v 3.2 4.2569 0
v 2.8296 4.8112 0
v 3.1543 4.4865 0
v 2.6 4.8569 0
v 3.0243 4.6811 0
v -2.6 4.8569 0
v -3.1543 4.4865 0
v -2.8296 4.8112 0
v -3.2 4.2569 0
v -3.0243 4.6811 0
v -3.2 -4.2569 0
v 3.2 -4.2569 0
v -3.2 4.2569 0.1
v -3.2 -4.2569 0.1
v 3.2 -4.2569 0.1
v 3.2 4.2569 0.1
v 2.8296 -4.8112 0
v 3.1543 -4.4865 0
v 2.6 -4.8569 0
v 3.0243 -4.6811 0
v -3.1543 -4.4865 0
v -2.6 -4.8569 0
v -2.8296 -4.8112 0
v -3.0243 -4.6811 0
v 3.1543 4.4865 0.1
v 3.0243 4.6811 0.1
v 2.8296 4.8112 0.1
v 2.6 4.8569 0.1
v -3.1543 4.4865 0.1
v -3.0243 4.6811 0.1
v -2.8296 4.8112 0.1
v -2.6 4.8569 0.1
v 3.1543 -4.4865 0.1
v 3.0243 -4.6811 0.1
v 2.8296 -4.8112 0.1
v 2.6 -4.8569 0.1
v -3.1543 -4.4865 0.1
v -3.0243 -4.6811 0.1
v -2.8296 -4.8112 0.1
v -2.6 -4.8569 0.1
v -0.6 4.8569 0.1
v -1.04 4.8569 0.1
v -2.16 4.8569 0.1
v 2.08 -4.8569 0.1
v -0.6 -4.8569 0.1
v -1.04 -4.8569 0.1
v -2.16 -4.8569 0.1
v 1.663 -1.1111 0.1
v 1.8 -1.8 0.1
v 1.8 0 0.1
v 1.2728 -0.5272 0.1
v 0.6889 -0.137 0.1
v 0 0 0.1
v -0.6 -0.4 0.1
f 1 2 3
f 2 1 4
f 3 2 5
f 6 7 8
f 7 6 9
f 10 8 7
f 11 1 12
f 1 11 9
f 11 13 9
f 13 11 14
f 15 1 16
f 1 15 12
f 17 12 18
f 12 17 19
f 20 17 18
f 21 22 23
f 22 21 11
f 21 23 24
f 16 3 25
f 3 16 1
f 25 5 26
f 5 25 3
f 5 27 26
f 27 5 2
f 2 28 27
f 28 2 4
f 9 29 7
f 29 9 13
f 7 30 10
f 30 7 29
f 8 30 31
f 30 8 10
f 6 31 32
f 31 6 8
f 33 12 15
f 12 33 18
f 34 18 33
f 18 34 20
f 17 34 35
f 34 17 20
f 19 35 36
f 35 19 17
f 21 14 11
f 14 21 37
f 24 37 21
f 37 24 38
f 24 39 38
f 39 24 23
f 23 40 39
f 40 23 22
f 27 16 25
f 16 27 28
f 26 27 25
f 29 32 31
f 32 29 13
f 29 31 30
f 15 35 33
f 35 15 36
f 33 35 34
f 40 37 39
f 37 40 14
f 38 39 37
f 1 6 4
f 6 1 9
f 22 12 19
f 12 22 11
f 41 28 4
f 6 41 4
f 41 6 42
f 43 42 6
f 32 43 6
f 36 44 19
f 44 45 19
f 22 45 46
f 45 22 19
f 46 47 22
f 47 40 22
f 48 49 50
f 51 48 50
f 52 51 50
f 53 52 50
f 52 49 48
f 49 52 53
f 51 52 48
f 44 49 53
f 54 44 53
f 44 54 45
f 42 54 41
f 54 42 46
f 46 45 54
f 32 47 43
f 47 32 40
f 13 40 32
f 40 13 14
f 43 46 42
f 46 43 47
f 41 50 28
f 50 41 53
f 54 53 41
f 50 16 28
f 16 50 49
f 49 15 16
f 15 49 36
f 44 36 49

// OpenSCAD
// file: ../p/box3u12.scad
use <../lib.scad>
function ldraw_lib__box3u12() = [
// 0 Box with 3 Parallel Faces without Any Edges
// 0 Name: box3u12.dat
// 0 Author: J.C. Tchang [tchang]
// 0 !LDRAW_ORG Primitive UPDATE 2014-02
// 0 !LICENSE Licensed under CC BY 4.0 : see CAreadme.txt
// 
// 0 BFC CERTIFY CCW
  [0,"BFC","CERTIFY"],
  [0,"BFC","CCW"],
// 
// 0 !HISTORY 2014-12-23 [PTadmin] Official Update 2014-02
// 
// 
// 4 16 -1 1 1 1 1 1 1 1 -1 -1 1 -1
  [4,16,-1,1,1,1,1,1,1,1,-1,-1,1,-1],
// 4 16 -1 1 1 -1 0 1 1 0 1 1 1 1
  [4,16,-1,1,1,-1,0,1,1,0,1,1,1,1],
// 4 16 1 1 -1 1 0 -1 -1 0 -1 -1 1 -1
  [4,16,1,1,-1,1,0,-1,-1,0,-1,-1,1,-1],
];
module ldraw_lib__box3u12(step=0, col=false, unit=2/5, alt=false, line=0.2, solid=!$preview)
    makepoly(ldraw_lib__box3u12(), step=step, col=col, unit=unit, alt=alt, line=line, solid=solid);
ldraw_lib__box3u12(line=0.2);
// file: ../p/1-4ndis.scad
use <../lib.scad>
function ldraw_lib__1_4ndis() = [
// 0 Disc Negative 0.25
// 0 Name: 1-4ndis.dat
// 0 Author: James Jessiman
// 0 !LDRAW_ORG Primitive UPDATE 2012-01
// 0 !LICENSE Licensed under CC BY 4.0 : see CAreadme.txt
// 
// 0 BFC CERTIFY CCW
  [0,"BFC","CERTIFY"],
  [0,"BFC","CCW"],
// 
// 0 !HISTORY 2002-03-23 [sbliss] Added BFC Statement
// 0 !HISTORY 2002-04-25 [PTadmin] Official Update 2002-02
// 0 !HISTORY 2007-06-22 [PTadmin] Header formatted for Contributor Agreement
// 0 !HISTORY 2008-07-01 [PTadmin] Official Update 2008-01
// 0 !HISTORY 2012-02-16 [Philo] Changed to CCW
// 0 !HISTORY 2012-03-30 [PTadmin] Official Update 2012-01
// 
// 
// 3 16 0.9239 0 0.3827 1 0 0 1 0 1
  [3,16,0.9239,0,0.3827,1,0,0,1,0,1],
// 3 16 0.7071 0 0.7071 0.9239 0 0.3827 1 0 1
  [3,16,0.7071,0,0.7071,0.9239,0,0.3827,1,0,1],
// 3 16 0.3827 0 0.9239 0.7071 0 0.7071 1 0 1
  [3,16,0.3827,0,0.9239,0.7071,0,0.7071,1,0,1],
// 3 16 0 0 1 0.3827 0 0.9239 1 0 1
  [3,16,0,0,1,0.3827,0,0.9239,1,0,1],
];
module ldraw_lib__1_4ndis(step=0, col=false, unit=2/5, alt=false, line=0.2, solid=!$preview)
    makepoly(ldraw_lib__1_4ndis(), step=step, col=col, unit=unit, alt=alt, line=line, solid=solid);
ldraw_lib__1_4ndis(line=0.2);
// file: ../p/1-4cyli.scad
use <../lib.scad>
function ldraw_lib__1_4cyli() = [
// 0 Cylinder 0.25
// 0 Name: 1-4cyli.dat
// 0 Author: James Jessiman
// 0 !LDRAW_ORG Primitive UPDATE 2012-01
// 0 !LICENSE Licensed under CC BY 4.0 : see CAreadme.txt
// 
// 0 BFC CERTIFY CCW
  [0,"BFC","CERTIFY"],
  [0,"BFC","CCW"],
// 
// 0 !HISTORY 2002-03-23 [sbliss] Added BFC statement.
// 0 !HISTORY 2002-04-25 [PTadmin] Official Update 2002-02
// 0 !HISTORY 2007-06-22 [PTadmin] Header formatted for Contributor Agreement
// 0 !HISTORY 2008-07-01 [PTadmin] Official Update 2008-01
// 0 !HISTORY 2012-02-16 [Philo] Changed to CCW
// 0 !HISTORY 2012-03-30 [PTadmin] Official Update 2012-01
// 
// 
// 4 16 1 1 0 0.9239 1 0.3827 0.9239 0 0.3827 1 0 0
  [4,16,1,1,0,0.9239,1,0.3827,0.9239,0,0.3827,1,0,0],
// 5 24 1 0 0 1 1 0 0.9239 0 0.3827 1 0 -1
  [5,24,1,0,0,1,1,0,0.9239,0,0.3827,1,0,-1],
// 4 16 0.9239 1 0.3827 0.7071 1 0.7071 0.7071 0 0.7071 0.9239 0 0.3827
  [4,16,0.9239,1,0.3827,0.7071,1,0.7071,0.7071,0,0.7071,0.9239,0,0.3827],
// 5 24 0.9239 0 0.3827 0.9239 1 0.3827 0.7071 0 0.7071 1 0 0
  [5,24,0.9239,0,0.3827,0.9239,1,0.3827,0.7071,0,0.7071,1,0,0],
// 4 16 0.7071 1 0.7071 0.3827 1 0.9239 0.3827 0 0.9239 0.7071 0 0.7071
  [4,16,0.7071,1,0.7071,0.3827,1,0.9239,0.3827,0,0.9239,0.7071,0,0.7071],
// 5 24 0.7071 0 0.7071 0.7071 1 0.7071 0.3827 0 0.9239 0.9239 0 0.3827
  [5,24,0.7071,0,0.7071,0.7071,1,0.7071,0.3827,0,0.9239,0.9239,0,0.3827],
// 4 16 0.3827 1 0.9239 0 1 1 0 0 1 0.3827 0 0.9239
  [4,16,0.3827,1,0.9239,0,1,1,0,0,1,0.3827,0,0.9239],
// 5 24 0.3827 0 0.9239 0.3827 1 0.9239 0 0 1 0.7071 0 0.7071
  [5,24,0.3827,0,0.9239,0.3827,1,0.9239,0,0,1,0.7071,0,0.7071],
// 5 24 0 0 1 0 1 1 0.3827 0 0.9239 -1 0 1
  [5,24,0,0,1,0,1,1,0.3827,0,0.9239,-1,0,1],
];
module ldraw_lib__1_4cyli(step=0, col=false, unit=2/5, alt=false, line=0.2, solid=!$preview)
    makepoly(ldraw_lib__1_4cyli(), step=step, col=col, unit=unit, alt=alt, line=line, solid=solid);
ldraw_lib__1_4cyli(line=0.2);
// file: ../p/1-4chrd.scad
use <../lib.scad>
function ldraw_lib__1_4chrd() = [
// 0 Chord 0.25
// 0 Name: 1-4chrd.dat
// 0 Author: Tony Hafner [hafhead]
// 0 !LDRAW_ORG Primitive UPDATE 2012-02
// 0 !LICENSE Licensed under CC BY 2.0 and CC BY 4.0 : see CAreadme.txt
// 
// 0 BFC CERTIFY CCW
  [0,"BFC","CERTIFY"],
  [0,"BFC","CCW"],
// 
// 0 !HISTORY 2004-04-22 [PTadmin] Official Update 2004-02
// 0 !HISTORY 2007-10-09 [PTadmin] Header formatted for Contributor Agreement
// 0 !HISTORY 2008-07-01 [PTadmin] Official Update 2008-01
// 0 !HISTORY 2012-08-02 [MMR1988] Re-creation with PrimGen2 and Rectifier
// 0 !HISTORY 2012-08-09 [PTadmin] Official Update 2012-02
// 
// 
// 4 16 0.9239 0 0.3827 0.3827 0 0.9239 0 0 1 1 0 0
  [4,16,0.9239,0,0.3827,0.3827,0,0.9239,0,0,1,1,0,0],
// 3 16 0.7071 0 0.7071 0.3827 0 0.9239 0.9239 0 0.3827
  [3,16,0.7071,0,0.7071,0.3827,0,0.9239,0.9239,0,0.3827],
];
module ldraw_lib__1_4chrd(step=0, col=false, unit=2/5, alt=false, line=0.2, solid=!$preview)
    makepoly(ldraw_lib__1_4chrd(), step=step, col=col, unit=unit, alt=alt, line=line, solid=solid);
ldraw_lib__1_4chrd(line=0.2);
// file: 6142275i.scad
use <../lib.scad>
use <../p/1-4chrd.scad>
use <../p/1-4cyli.scad>
use <../p/1-4ndis.scad>
use <../p/box3u12.scad>
function ldraw_lib__6142275i() = [
// 0 Sticker  1.2 x  0.8 with Red Line on Black, Grey and White Background Right
// 0 Name: 6142275i.dat
// 0 Author: Massimo Maso [Sirio]
// 0 !LDRAW_ORG Part UPDATE 2022-06
// 0 !LICENSE Licensed under CC BY 4.0 : see CAreadme.txt
// 
// 0 BFC CERTIFY CCW
  [0,"BFC","CERTIFY"],
  [0,"BFC","CCW"],
// 
// 0 !KEYWORDS Audi, e-tron, quattro, R18, Set 75872, Speed Champions
// 
// 0 !HISTORY 2022-12-20 [PTadmin] Official Update 2022-06
// 
// 
// 0 // Primitives
// 1 16 -6.5 0 10.6422 -1.5 0 0 0 -1 0 0 0 1.5 1-4chrd.dat
  [1,16,-6.5,0,10.6422,-1.5,0,0,0,-1,0,0,0,1.5, ldraw_lib__1_4chrd()],
// 1 16 6.5 0 10.6422 1.5 0 0 0 -1 0 0 0 1.5 1-4chrd.dat
  [1,16,6.5,0,10.6422,1.5,0,0,0,-1,0,0,0,1.5, ldraw_lib__1_4chrd()],
// 1 16 0 -.25 0 0 0 8 0 .25 0 10.6422 0 0 box3u12.dat
  [1,16,0,-.25,0,0,0,8,0,.25,0,10.6422,0,0, ldraw_lib__box3u12()],
// 1 16 -6.5 0 -10.6422 -1.5 0 0 0 -1 0 0 0 -1.5 1-4chrd.dat
  [1,16,-6.5,0,-10.6422,-1.5,0,0,0,-1,0,0,0,-1.5, ldraw_lib__1_4chrd()],
// 1 16 6.5 0 -10.6422 1.5 0 0 0 -1 0 0 0 -1.5 1-4chrd.dat
  [1,16,6.5,0,-10.6422,1.5,0,0,0,-1,0,0,0,-1.5, ldraw_lib__1_4chrd()],
// 1 16 -6.5 0 10.6422 -1.5 0 0 0 -.25 0 0 0 1.5 1-4cyli.dat
  [1,16,-6.5,0,10.6422,-1.5,0,0,0,-.25,0,0,0,1.5, ldraw_lib__1_4cyli()],
// 1 16 6.5 0 10.6422 1.5 0 0 0 -.25 0 0 0 1.5 1-4cyli.dat
  [1,16,6.5,0,10.6422,1.5,0,0,0,-.25,0,0,0,1.5, ldraw_lib__1_4cyli()],
// 1 16 -6.5 0 -10.6422 -1.5 0 0 0 -.25 0 0 0 -1.5 1-4cyli.dat
  [1,16,-6.5,0,-10.6422,-1.5,0,0,0,-.25,0,0,0,-1.5, ldraw_lib__1_4cyli()],
// 1 16 6.5 0 -10.6422 1.5 0 0 0 -.25 0 0 0 -1.5 1-4cyli.dat
  [1,16,6.5,0,-10.6422,1.5,0,0,0,-.25,0,0,0,-1.5, ldraw_lib__1_4cyli()],
// 1 15 -6.5 -.25 10.6422 -1.5 0 0 0 1 0 0 0 1.5 1-4chrd.dat
  [1,15,-6.5,-.25,10.6422,-1.5,0,0,0,1,0,0,0,1.5, ldraw_lib__1_4chrd()],
// 1 71 6.5 -.25 10.6422 1.5 0 0 0 1 0 0 0 1.5 1-4chrd.dat
  [1,71,6.5,-.25,10.6422,1.5,0,0,0,1,0,0,0,1.5, ldraw_lib__1_4chrd()],
// 1 15 -6.5 -.25 -10.6422 -1.5 0 0 0 1 0 0 0 -1.5 1-4chrd.dat
  [1,15,-6.5,-.25,-10.6422,-1.5,0,0,0,1,0,0,0,-1.5, ldraw_lib__1_4chrd()],
// 1 71 6.5 -.25 -10.6422 1.5 0 0 0 1 0 0 0 -1.5 1-4chrd.dat
  [1,71,6.5,-.25,-10.6422,1.5,0,0,0,1,0,0,0,-1.5, ldraw_lib__1_4chrd()],
// 0 // Bottom faces
// 4 16 6.5 0 12.1422 8 0 10.6422 -8 0 10.6422 -6.5 0 12.1422
  [4,16,6.5,0,12.1422,8,0,10.6422,-8,0,10.6422,-6.5,0,12.1422],
// 4 16 6.5 0 -12.1422 -6.5 0 -12.1422 -8 0 -10.6422 8 0 -10.6422
  [4,16,6.5,0,-12.1422,-6.5,0,-12.1422,-8,0,-10.6422,8,0,-10.6422],
// 0 // Lateral faces
// 3 16 -6.5 0 12.1422 -6.5 -.25 12.1422 1.5 -.25 12.1422
  [3,16,-6.5,0,12.1422,-6.5,-.25,12.1422,1.5,-.25,12.1422],
// 4 16 -6.5 0 12.1422 1.5 -.25 12.1422 2.6 -.25 12.1422 6.5 0 12.1422
  [4,16,-6.5,0,12.1422,1.5,-.25,12.1422,2.6,-.25,12.1422,6.5,0,12.1422],
// 3 16 6.5 0 12.1422 2.6 -.25 12.1422 5.4 -.25 12.1422
  [3,16,6.5,0,12.1422,2.6,-.25,12.1422,5.4,-.25,12.1422],
// 3 16 6.5 0 12.1422 5.4 -.25 12.1422 6.5 -.25 12.1422
  [3,16,6.5,0,12.1422,5.4,-.25,12.1422,6.5,-.25,12.1422],
// 3 16 -6.5 0 -12.1422 -5.2 -.25 -12.1422 -6.5 -.25 -12.1422
  [3,16,-6.5,0,-12.1422,-5.2,-.25,-12.1422,-6.5,-.25,-12.1422],
// 3 16 -6.5 0 -12.1422 1.5 -.25 -12.1422 -5.2 -.25 -12.1422
  [3,16,-6.5,0,-12.1422,1.5,-.25,-12.1422,-5.2,-.25,-12.1422],
// 4 16 -6.5 0 -12.1422 6.5 0 -12.1422 2.6 -.25 -12.1422 1.5 -.25 -12.1422
  [4,16,-6.5,0,-12.1422,6.5,0,-12.1422,2.6,-.25,-12.1422,1.5,-.25,-12.1422],
// 3 16 6.5 0 -12.1422 5.4 -.25 -12.1422 2.6 -.25 -12.1422
  [3,16,6.5,0,-12.1422,5.4,-.25,-12.1422,2.6,-.25,-12.1422],
// 3 16 6.5 0 -12.1422 6.5 -.25 -12.1422 5.4 -.25 -12.1422
  [3,16,6.5,0,-12.1422,6.5,-.25,-12.1422,5.4,-.25,-12.1422],
// 0 // Top faces
// 0 // Primitives
// 1 15 0 -.25 -4.5 -4.5 0 0 0 1 0 0 0 4.5 1-4ndis.dat
  [1,15,0,-.25,-4.5,-4.5,0,0,0,1,0,0,0,4.5, ldraw_lib__1_4ndis()],
// 1 0 0 -.25 -4.5 -4.5 0 0 0 1 0 0 0 4.5 1-4chrd.dat
  [1,0,0,-.25,-4.5,-4.5,0,0,0,1,0,0,0,4.5, ldraw_lib__1_4chrd()],
// 0 //Black faces
// 3 0 0 -.25 0 -4.5 -.25 -4.5 -5.2 -.25 -12.1422
  [3,0,0,-.25,0,-4.5,-.25,-4.5,-5.2,-.25,-12.1422],
// 4 0 0 -.25 0 -5.2 -.25 -12.1422 1.5 -.25 -12.1422 1.5 -.25 -1
  [4,0,0,-.25,0,-5.2,-.25,-12.1422,1.5,-.25,-12.1422,1.5,-.25,-1],
// 0 // Grey faces
// 4 71 1.5 -.25 12.1422 1.5 -.25 -1 2.6 -.25 -12.1422 2.6 -.25 12.1422
  [4,71,1.5,-.25,12.1422,1.5,-.25,-1,2.6,-.25,-12.1422,2.6,-.25,12.1422],
// 3 71 1.5 -.25 -1 1.5 -.25 -12.1422 2.6 -.25 -12.1422
  [3,71,1.5,-.25,-1,1.5,-.25,-12.1422,2.6,-.25,-12.1422],
// 4 71 5.4 -.25 12.1422 5.4 -.25 -12.1422 6.5 -.25 -12.1422 6.5 -.25 12.1422
  [4,71,5.4,-.25,12.1422,5.4,-.25,-12.1422,6.5,-.25,-12.1422,6.5,-.25,12.1422],
// 4 71 6.5 -.25 12.1422 6.5 -.25 -12.1422 8 -.25 -10.6422 8 -.25 10.6422
  [4,71,6.5,-.25,12.1422,6.5,-.25,-12.1422,8,-.25,-10.6422,8,-.25,10.6422],
// 0 // Red faces
// 4 4 2.6 -.25 12.1422 2.6 -.25 -12.1422 5.4 -.25 -12.1422 5.4 -.25 12.1422
  [4,4,2.6,-.25,12.1422,2.6,-.25,-12.1422,5.4,-.25,-12.1422,5.4,-.25,12.1422],
// 0 // White faces
// 4 15 1.5 -.25 12.1422 -6.5 -.25 12.1422 -4.5 -.25 0 0 -.25 0
  [4,15,1.5,-.25,12.1422,-6.5,-.25,12.1422,-4.5,-.25,0,0,-.25,0],
// 3 15 1.5 -.25 12.1422 0 -.25 0 1.5 -.25 -1
  [3,15,1.5,-.25,12.1422,0,-.25,0,1.5,-.25,-1],
// 4 15 -4.5 -.25 -4.5 -4.5 -.25 0 -6.5 -.25 12.1422 -8 -.25 10.6422
  [4,15,-4.5,-.25,-4.5,-4.5,-.25,0,-6.5,-.25,12.1422,-8,-.25,10.6422],
// 4 15 -4.5 -.25 -4.5 -8 -.25 10.6422 -8 -.25 -10.6422 -6.5 -.25 -12.1422
  [4,15,-4.5,-.25,-4.5,-8,-.25,10.6422,-8,-.25,-10.6422,-6.5,-.25,-12.1422],
// 3 15 -4.5 -.25 -4.5 -6.5 -.25 -12.1422 -5.2 -.25 -12.1422
  [3,15,-4.5,-.25,-4.5,-6.5,-.25,-12.1422,-5.2,-.25,-12.1422],
];
module ldraw_lib__6142275i(step=0, col=false, unit=2/5, alt=false, line=0.2, solid=!$preview)
    makepoly(ldraw_lib__6142275i(), step=step, col=col, unit=unit, alt=alt, line=line, solid=solid);
ldraw_lib__6142275i(line=0.2);
// main file
use <../lib.scad>
use <6142275i.scad>
function ldraw_lib__6142275j() = [
// 0 Sticker  1.2 x  0.8 with Red Line on Black, Grey and White Background Left
// 0 Name: 6142275j.dat
// 0 Author: Massimo Maso [Sirio]
// 0 !LDRAW_ORG Part UPDATE 2022-06
// 0 !LICENSE Licensed under CC BY 4.0 : see CAreadme.txt
// 
// 0 BFC CERTIFY CCW
  [0,"BFC","CERTIFY"],
  [0,"BFC","CCW"],
// 
// 0 !KEYWORDS Audi, e-tron, quattro, R18, Set 75872, Speed Champions
// 
// 0 !HISTORY 2022-12-20 [PTadmin] Official Update 2022-06
// 
// 
// 1 16 0 0 0 -1 0 0 0 1 0 0 0 1 6142275i.dat
  [1,16,0,0,0,-1,0,0,0,1,0,0,0,1, ldraw_lib__6142275i()],
];
module ldraw_lib__6142275j(step=0, col=false, unit=2/5, alt=false, line=0.2, solid=!$preview)
    makepoly(ldraw_lib__6142275j(), step=step, col=col, unit=unit, alt=alt, line=line, solid=solid);
ldraw_lib__6142275j(line=0.2);
